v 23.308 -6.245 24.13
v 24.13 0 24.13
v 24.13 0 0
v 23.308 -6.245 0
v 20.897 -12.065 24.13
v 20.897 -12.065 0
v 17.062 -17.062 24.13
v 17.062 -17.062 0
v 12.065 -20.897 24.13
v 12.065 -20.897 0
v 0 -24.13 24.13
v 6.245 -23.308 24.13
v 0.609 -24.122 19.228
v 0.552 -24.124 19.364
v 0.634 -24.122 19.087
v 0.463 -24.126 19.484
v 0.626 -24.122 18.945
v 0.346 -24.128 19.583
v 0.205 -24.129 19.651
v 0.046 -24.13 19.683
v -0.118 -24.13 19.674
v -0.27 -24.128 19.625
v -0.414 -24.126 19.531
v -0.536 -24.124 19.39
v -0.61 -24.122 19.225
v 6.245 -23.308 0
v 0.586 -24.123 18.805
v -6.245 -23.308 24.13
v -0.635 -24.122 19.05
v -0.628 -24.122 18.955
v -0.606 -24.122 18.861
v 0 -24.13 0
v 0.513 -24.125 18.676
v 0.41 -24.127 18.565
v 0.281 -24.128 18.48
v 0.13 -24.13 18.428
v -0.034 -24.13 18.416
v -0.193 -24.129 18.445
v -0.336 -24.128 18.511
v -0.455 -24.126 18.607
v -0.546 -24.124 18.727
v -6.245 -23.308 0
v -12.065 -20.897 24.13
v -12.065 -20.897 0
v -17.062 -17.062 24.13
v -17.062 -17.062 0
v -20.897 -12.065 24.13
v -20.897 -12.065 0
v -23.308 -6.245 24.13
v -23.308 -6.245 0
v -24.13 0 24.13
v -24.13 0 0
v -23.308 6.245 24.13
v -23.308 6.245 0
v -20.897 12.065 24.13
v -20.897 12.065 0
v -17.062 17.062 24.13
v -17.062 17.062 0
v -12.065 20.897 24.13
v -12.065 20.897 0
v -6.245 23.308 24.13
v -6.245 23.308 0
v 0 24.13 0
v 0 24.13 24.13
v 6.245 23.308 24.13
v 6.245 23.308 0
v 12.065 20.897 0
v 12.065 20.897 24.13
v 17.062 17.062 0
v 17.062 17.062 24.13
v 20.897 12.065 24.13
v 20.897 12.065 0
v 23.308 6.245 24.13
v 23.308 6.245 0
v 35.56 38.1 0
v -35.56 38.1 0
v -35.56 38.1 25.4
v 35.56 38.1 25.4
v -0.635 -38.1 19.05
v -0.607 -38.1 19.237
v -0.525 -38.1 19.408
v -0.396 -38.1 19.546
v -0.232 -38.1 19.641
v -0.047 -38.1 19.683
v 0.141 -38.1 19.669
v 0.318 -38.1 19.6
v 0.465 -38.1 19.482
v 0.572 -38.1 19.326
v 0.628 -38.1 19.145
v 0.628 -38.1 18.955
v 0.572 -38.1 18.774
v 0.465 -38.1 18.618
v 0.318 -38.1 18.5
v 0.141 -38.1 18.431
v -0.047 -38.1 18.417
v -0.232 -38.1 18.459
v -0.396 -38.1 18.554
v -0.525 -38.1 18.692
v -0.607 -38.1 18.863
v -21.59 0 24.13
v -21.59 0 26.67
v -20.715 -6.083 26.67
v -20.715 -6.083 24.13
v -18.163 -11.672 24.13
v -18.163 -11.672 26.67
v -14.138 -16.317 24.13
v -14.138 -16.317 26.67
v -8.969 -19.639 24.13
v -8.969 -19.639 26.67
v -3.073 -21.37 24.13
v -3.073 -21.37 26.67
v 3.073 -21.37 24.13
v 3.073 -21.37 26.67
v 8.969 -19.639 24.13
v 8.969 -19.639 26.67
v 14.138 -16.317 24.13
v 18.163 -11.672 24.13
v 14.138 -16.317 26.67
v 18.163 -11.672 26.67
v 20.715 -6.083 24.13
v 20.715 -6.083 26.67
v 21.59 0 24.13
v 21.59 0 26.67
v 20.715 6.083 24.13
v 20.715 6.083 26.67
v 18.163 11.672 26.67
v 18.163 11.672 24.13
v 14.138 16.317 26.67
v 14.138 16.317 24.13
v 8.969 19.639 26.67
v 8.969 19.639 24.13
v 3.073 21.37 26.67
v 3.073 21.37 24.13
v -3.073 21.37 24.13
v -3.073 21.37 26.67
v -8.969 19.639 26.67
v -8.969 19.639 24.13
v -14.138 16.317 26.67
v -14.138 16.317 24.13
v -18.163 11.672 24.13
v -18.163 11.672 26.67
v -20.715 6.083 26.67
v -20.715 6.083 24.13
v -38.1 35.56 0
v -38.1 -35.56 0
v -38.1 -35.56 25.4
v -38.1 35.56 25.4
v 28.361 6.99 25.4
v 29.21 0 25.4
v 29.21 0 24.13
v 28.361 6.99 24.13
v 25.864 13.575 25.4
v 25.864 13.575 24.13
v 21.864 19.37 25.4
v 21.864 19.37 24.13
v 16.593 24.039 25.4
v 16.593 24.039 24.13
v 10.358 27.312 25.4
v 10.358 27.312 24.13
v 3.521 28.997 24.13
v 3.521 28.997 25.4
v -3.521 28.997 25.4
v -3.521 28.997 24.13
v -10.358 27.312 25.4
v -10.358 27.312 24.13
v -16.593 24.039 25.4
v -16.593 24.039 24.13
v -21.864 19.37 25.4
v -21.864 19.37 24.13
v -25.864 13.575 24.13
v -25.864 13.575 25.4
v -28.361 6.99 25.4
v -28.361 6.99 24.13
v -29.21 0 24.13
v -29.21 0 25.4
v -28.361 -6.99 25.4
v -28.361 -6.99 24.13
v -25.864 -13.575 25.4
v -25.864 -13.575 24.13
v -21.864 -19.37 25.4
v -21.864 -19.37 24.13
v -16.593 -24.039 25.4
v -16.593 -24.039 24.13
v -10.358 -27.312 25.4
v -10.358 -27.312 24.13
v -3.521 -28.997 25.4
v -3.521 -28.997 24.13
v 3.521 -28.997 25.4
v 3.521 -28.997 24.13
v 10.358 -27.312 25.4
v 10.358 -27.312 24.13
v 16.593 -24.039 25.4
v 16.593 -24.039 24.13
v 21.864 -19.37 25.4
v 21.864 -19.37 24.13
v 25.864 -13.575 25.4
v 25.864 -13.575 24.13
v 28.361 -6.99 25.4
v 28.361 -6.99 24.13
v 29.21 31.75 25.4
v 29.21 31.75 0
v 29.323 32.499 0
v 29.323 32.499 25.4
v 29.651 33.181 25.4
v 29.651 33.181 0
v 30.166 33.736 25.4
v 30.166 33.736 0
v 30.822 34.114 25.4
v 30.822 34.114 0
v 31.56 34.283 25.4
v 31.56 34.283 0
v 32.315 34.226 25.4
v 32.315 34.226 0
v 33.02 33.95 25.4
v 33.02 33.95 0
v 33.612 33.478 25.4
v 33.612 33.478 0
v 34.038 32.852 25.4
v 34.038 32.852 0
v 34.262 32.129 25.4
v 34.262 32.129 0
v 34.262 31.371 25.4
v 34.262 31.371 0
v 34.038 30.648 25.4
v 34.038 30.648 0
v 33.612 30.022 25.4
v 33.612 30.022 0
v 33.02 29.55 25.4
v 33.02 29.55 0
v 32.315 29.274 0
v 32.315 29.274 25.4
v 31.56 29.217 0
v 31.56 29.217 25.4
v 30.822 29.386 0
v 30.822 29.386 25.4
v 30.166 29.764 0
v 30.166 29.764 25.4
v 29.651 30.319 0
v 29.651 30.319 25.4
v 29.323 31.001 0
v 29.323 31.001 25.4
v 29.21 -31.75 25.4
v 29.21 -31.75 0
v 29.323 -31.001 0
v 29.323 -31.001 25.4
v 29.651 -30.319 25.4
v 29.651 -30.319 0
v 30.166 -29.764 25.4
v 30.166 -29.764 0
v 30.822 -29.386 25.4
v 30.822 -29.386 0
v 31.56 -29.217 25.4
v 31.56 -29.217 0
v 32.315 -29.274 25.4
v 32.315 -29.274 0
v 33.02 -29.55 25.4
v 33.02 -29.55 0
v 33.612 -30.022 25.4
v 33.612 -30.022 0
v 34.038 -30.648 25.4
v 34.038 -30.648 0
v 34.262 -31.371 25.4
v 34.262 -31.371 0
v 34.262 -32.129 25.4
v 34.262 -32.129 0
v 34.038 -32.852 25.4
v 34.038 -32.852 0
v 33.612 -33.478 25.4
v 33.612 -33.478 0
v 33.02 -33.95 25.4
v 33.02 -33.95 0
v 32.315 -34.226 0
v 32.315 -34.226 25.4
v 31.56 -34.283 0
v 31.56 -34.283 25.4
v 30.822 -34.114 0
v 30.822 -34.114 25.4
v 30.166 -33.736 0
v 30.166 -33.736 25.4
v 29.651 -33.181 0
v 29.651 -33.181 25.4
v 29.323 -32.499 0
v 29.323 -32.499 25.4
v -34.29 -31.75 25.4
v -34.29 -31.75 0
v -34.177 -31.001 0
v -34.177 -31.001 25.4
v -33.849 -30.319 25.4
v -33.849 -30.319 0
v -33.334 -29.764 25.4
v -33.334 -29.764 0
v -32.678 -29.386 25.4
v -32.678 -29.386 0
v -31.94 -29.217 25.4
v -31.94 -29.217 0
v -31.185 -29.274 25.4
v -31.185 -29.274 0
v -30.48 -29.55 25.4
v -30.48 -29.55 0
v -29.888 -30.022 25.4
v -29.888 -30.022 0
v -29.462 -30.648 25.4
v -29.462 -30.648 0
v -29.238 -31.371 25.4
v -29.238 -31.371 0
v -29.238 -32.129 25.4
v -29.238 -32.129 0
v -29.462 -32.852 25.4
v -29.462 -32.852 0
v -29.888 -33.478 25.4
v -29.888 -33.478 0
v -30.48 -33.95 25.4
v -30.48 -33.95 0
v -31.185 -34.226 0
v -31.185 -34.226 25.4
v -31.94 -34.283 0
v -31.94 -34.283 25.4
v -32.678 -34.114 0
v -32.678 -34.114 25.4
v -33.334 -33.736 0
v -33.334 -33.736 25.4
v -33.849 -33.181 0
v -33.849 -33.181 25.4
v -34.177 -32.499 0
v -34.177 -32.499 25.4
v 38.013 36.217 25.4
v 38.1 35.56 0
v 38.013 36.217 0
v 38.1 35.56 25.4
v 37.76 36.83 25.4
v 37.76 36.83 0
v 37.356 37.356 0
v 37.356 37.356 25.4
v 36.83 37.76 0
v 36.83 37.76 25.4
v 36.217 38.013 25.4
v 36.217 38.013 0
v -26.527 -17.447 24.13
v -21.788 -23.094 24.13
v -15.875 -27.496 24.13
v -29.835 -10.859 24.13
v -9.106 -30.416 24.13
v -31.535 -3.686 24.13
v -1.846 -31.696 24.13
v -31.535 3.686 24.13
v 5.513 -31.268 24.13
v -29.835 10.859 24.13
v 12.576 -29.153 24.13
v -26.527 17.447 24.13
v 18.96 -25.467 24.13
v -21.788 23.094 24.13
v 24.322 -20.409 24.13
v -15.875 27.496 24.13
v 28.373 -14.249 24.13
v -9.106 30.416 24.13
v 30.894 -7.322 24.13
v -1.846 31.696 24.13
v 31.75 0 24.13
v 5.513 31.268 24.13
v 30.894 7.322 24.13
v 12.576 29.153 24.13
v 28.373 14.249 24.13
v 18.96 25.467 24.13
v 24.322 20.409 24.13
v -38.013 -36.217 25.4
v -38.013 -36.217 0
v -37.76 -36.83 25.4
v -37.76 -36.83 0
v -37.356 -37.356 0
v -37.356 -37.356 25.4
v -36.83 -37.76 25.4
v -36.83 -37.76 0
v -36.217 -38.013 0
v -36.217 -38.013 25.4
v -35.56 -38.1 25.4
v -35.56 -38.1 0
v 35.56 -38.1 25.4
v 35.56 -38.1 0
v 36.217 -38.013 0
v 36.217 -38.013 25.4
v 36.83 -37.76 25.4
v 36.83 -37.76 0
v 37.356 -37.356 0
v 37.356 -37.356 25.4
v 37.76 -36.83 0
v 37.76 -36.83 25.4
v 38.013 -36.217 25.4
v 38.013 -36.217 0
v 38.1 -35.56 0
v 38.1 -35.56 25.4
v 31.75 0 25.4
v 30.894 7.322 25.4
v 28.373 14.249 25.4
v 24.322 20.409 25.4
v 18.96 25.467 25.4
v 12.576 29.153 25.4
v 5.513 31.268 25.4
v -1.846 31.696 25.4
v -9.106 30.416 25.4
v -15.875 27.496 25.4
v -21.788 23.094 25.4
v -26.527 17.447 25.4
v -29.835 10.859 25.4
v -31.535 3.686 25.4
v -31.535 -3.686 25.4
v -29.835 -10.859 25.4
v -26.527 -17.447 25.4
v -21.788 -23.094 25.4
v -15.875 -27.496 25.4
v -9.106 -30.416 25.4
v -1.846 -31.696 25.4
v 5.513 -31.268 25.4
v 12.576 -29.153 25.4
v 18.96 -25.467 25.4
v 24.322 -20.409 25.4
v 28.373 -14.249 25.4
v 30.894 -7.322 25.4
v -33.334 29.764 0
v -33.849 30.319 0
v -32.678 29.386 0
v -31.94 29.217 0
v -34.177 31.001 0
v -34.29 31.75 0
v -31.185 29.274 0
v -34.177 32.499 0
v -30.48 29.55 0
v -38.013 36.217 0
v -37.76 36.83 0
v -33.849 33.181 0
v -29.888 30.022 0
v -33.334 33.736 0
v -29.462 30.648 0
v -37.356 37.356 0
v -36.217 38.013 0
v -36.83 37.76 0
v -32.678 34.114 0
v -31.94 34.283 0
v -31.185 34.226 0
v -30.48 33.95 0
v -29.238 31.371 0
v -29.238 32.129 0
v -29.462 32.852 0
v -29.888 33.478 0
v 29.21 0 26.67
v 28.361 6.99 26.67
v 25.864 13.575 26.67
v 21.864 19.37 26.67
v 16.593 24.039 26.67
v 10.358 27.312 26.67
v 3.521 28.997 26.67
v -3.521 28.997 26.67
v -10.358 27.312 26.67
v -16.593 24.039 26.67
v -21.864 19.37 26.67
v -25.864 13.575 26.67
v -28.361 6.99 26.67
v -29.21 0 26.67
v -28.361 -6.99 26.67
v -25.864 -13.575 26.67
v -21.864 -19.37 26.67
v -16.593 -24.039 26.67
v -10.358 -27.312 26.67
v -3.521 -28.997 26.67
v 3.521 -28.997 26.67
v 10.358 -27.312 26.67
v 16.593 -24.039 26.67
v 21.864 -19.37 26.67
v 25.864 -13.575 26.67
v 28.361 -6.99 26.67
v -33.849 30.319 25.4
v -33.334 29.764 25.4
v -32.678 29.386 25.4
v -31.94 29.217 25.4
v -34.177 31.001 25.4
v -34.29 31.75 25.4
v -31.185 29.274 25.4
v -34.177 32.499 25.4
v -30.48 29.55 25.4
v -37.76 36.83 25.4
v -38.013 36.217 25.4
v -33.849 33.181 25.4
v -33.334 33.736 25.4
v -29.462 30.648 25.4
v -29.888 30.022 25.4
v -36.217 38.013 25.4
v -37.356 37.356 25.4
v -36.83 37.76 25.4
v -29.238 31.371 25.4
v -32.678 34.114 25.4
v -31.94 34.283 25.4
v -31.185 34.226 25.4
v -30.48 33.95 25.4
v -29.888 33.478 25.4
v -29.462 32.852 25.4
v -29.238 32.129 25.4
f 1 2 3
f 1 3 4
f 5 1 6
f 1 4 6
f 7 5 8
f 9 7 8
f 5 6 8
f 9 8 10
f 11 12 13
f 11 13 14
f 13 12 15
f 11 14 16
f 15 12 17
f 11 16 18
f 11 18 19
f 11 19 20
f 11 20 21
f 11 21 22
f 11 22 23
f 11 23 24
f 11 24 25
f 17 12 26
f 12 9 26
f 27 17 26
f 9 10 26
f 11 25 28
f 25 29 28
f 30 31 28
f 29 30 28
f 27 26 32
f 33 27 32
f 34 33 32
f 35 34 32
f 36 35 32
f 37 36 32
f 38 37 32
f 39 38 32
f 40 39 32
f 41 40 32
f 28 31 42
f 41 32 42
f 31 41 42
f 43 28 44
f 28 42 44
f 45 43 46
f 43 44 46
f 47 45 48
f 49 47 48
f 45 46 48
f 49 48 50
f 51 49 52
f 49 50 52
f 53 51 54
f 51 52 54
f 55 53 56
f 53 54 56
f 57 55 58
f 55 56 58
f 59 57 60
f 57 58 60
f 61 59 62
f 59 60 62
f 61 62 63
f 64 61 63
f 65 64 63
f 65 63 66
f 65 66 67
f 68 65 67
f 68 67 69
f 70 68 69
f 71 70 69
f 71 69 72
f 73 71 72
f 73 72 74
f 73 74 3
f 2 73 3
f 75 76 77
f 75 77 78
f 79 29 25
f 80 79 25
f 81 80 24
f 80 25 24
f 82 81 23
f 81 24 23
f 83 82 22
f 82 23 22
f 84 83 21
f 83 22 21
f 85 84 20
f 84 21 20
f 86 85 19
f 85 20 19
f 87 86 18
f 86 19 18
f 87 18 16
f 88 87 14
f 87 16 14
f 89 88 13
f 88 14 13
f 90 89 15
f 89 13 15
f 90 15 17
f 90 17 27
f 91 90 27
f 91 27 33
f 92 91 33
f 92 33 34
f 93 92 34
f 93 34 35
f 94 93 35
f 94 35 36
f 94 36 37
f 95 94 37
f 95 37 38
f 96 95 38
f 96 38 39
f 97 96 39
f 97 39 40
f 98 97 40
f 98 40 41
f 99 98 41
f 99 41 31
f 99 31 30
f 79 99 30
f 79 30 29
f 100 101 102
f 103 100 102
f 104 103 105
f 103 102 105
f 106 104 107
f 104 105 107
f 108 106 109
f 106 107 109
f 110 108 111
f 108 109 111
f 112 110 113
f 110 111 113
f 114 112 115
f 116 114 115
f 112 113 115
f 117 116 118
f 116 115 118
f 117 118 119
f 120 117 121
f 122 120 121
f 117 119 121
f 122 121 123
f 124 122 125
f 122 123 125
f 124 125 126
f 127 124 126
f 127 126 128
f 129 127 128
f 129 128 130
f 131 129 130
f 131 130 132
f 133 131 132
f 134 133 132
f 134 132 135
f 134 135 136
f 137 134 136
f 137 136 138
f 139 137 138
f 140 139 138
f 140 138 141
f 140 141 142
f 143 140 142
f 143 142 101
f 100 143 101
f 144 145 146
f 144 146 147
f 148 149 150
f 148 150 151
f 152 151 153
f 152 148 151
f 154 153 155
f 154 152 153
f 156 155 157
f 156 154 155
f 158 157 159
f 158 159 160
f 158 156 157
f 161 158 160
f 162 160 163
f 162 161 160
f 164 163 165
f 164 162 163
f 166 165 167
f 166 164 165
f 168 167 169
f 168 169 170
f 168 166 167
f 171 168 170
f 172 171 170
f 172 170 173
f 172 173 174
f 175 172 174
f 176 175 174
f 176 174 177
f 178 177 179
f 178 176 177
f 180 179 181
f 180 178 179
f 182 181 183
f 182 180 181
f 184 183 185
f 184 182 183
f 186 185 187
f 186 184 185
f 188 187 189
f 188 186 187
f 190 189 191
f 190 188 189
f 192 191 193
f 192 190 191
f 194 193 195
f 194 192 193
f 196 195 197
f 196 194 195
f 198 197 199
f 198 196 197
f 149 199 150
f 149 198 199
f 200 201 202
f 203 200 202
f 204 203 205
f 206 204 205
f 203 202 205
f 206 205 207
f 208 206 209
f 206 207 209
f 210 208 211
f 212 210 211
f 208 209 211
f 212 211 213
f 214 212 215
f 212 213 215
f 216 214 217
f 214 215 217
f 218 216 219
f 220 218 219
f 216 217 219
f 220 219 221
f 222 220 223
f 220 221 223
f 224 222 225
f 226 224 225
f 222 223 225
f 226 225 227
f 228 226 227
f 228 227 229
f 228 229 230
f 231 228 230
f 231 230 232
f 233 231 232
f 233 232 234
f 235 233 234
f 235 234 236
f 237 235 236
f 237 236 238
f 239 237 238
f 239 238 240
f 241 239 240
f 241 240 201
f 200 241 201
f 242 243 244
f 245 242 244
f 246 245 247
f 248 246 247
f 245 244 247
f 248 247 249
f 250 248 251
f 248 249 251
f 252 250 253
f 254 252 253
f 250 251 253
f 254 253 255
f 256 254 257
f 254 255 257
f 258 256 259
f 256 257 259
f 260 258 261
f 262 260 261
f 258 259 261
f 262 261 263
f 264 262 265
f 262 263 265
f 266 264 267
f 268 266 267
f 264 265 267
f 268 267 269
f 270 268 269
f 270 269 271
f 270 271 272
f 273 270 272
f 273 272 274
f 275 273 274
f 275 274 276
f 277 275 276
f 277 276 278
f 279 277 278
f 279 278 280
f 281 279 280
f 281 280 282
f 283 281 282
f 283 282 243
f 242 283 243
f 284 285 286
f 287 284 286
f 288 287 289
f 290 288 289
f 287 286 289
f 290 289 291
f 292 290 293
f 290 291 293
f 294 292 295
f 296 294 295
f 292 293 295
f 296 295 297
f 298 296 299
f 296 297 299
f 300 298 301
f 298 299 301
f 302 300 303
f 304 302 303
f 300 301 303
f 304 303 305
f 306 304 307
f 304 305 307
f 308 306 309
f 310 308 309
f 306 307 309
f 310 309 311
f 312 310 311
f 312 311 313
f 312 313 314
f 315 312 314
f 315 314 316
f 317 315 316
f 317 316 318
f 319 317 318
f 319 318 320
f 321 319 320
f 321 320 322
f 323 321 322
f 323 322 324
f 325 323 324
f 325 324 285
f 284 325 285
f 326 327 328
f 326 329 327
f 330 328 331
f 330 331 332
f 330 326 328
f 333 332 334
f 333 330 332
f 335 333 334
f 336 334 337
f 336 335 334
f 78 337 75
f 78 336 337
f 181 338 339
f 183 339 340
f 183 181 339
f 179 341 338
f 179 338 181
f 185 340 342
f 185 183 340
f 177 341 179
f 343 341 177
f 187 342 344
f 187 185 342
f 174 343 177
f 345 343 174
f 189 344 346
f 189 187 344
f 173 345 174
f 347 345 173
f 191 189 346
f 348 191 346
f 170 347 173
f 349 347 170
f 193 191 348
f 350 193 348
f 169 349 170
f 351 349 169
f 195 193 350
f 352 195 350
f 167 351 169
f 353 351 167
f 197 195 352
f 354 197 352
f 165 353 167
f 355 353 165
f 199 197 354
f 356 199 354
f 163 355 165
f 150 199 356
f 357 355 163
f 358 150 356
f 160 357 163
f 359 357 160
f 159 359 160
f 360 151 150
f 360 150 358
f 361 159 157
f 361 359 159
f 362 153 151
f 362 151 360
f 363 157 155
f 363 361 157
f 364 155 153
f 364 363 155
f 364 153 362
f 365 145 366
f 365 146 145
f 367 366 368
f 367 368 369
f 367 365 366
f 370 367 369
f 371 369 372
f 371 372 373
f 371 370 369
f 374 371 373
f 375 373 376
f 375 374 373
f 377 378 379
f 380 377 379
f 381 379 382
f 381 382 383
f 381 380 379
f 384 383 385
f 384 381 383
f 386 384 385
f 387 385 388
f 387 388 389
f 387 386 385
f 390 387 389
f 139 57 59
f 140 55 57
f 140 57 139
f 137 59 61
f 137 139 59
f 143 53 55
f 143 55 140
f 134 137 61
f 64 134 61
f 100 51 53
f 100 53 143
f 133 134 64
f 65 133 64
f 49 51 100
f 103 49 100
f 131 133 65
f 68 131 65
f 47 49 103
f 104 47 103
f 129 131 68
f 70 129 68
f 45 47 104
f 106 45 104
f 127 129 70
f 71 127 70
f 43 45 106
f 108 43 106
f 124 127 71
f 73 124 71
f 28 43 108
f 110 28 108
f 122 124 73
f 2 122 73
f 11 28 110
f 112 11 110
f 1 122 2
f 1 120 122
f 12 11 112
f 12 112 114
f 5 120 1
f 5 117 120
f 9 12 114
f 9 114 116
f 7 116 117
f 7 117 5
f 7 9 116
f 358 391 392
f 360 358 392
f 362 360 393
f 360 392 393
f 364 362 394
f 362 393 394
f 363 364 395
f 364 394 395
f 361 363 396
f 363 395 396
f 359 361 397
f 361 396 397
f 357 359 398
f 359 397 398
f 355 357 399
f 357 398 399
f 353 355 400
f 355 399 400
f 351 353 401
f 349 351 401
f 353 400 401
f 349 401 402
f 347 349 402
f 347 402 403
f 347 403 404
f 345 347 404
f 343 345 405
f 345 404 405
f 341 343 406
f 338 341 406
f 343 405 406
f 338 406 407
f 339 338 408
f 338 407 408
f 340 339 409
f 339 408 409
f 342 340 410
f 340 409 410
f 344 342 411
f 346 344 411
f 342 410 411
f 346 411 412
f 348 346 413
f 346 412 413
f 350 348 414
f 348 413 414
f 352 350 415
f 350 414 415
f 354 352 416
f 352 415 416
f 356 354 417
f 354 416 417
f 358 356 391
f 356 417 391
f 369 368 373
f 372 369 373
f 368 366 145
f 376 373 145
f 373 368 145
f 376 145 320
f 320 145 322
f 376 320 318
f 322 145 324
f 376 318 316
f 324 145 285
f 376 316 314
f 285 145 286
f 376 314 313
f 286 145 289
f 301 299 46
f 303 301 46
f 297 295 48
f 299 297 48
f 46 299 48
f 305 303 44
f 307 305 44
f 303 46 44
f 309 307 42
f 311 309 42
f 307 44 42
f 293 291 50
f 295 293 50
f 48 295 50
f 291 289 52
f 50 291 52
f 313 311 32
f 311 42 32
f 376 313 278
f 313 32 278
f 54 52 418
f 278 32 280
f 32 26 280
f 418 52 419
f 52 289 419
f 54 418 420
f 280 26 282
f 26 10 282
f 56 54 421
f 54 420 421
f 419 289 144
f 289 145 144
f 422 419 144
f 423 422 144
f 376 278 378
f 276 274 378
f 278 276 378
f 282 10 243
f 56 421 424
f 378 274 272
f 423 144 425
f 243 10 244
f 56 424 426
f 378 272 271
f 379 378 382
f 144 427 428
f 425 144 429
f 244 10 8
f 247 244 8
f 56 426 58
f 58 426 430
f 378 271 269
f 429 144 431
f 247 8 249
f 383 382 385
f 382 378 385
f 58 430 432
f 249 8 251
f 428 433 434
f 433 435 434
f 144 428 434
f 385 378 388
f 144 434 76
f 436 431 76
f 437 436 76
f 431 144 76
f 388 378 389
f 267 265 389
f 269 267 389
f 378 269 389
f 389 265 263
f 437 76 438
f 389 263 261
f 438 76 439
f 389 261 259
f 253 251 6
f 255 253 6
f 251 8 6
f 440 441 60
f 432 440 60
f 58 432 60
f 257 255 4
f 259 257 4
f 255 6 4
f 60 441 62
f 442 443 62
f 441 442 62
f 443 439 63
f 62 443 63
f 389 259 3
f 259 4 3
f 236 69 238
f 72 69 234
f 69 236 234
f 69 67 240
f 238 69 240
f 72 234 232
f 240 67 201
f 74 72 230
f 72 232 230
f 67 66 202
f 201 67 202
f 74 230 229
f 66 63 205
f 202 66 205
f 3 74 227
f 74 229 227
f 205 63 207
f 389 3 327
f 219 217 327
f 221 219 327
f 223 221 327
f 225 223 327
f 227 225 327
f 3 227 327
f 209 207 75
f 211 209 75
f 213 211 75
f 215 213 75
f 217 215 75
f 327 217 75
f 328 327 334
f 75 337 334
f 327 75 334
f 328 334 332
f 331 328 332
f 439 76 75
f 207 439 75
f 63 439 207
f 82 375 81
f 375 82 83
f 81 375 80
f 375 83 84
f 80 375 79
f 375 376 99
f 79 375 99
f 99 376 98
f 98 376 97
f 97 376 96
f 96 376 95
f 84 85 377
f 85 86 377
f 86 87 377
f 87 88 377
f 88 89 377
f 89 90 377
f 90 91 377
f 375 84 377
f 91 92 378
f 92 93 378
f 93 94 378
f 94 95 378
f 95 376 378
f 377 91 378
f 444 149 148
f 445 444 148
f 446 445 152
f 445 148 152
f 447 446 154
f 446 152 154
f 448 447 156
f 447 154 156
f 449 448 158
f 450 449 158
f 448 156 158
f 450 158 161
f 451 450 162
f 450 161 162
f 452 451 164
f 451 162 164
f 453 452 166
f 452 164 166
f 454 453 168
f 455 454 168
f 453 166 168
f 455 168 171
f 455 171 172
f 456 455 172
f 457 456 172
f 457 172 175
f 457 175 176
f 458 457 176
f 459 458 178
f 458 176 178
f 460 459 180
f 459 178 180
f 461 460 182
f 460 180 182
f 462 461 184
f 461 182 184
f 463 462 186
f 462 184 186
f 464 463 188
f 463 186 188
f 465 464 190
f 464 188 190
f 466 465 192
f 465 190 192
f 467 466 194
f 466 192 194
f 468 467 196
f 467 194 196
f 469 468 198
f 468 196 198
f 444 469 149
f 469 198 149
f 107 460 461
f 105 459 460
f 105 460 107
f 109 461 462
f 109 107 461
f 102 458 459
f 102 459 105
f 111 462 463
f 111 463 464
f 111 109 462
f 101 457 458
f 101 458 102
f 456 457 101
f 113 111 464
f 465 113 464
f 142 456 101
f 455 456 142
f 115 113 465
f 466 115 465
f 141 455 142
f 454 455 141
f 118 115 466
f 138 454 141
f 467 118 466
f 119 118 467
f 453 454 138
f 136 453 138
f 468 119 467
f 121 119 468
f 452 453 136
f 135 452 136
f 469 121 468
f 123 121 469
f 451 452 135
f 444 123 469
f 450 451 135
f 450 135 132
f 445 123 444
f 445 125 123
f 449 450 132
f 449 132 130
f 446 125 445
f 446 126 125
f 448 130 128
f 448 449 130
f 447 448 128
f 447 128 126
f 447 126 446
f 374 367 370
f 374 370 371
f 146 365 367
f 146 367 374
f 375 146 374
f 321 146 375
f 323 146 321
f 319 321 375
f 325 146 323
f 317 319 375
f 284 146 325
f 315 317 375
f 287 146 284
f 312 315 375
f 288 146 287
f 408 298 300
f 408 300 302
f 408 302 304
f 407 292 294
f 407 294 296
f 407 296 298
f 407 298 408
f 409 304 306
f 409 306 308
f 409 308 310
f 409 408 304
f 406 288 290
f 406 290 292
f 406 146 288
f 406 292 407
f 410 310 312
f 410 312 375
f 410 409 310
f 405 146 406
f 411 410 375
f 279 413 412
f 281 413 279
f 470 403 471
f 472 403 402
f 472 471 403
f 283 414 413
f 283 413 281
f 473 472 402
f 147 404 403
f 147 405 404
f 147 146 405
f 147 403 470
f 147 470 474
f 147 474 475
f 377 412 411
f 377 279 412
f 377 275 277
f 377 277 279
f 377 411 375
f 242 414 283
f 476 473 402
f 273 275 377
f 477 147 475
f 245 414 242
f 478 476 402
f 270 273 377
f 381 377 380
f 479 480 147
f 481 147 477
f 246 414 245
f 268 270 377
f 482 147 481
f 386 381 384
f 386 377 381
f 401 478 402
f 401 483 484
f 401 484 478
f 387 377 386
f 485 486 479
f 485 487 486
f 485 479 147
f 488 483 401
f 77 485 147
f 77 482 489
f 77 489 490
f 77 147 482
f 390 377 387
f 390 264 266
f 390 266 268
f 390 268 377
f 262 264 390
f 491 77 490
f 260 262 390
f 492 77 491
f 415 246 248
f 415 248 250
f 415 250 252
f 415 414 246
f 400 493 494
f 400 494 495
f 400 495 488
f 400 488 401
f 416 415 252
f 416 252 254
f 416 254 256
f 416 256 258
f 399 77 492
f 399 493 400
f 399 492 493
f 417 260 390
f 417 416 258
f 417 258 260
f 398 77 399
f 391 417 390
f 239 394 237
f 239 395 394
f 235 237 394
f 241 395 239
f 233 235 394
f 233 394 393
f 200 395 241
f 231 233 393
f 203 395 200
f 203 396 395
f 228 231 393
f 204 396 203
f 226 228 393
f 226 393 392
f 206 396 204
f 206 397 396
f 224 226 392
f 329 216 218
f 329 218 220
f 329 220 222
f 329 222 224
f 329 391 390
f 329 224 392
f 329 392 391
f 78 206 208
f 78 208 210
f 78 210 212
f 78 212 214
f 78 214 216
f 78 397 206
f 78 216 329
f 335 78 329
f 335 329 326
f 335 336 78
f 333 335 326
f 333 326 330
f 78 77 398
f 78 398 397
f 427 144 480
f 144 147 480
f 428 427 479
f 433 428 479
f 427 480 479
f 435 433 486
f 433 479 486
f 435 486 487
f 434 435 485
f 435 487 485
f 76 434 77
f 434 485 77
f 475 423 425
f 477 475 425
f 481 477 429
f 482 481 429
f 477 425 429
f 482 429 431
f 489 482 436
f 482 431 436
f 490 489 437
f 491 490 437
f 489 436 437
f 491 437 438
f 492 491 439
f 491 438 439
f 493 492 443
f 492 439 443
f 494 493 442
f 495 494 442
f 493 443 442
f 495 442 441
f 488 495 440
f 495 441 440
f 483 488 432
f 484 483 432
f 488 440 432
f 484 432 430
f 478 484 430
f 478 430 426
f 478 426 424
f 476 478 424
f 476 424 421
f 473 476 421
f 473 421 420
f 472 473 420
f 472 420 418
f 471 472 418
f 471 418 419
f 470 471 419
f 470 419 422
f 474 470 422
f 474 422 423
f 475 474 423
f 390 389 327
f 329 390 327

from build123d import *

# Parameters (mm, degrees)
F0_W      = 76.2
F0_H      = 76.2
F1_DEPTH  = 25.4
F2_R      = 2.54
F3_R      = 31.75
F3_R_2    = 29.21
F4_DEPTH  = 1.27
F5_D      = 5.08
F4_FACE_R = 29.21
F6_DEPTH  = 1.27
F7_R      = 24.13
F8_DEPTH  = 24.13
F9_D      = 43.18
F11_D     = 1.27
F11_DEPTH = 25.4


with BuildPart() as f1:
    # F0 (on Top) → F1 (new body)
    with BuildSketch(Plane.XY):
        Rectangle(F0_W, F0_H)
    extrude(amount=F1_DEPTH)

    # F2
    f2_edges = [f1.edges().sort_by_distance(p)[0] for p in [
        (38.1, -38.1, 12.7),
        (38.1, 38.1, 12.7),
        (-38.1, -38.1, 12.7),
        (-38.1, 38.1, 12.7),
    ]]
    fillet(f2_edges, radius=F2_R)

    # F3 (on face) → F4 (cut)
    with BuildSketch(Plane.XY.offset(25.4)):
        Circle(F3_R)
        Circle(F3_R_2, mode=Mode.SUBTRACT)
    extrude(amount=-F4_DEPTH, mode=Mode.SUBTRACT)

    # F5 (through all)
    with Locations(Plane.XY.offset(25.4)):
        with Locations((-31.75, 31.75), (31.75, 31.75), (31.75, -31.75), (-31.75, -31.75)):
            Hole(F5_D / 2)

    # F4_face (on face) → F6 (join)
    with BuildSketch(Plane.XY.offset(25.4)):
        Circle(F4_FACE_R)
    extrude(amount=F6_DEPTH)

    # F7 (on face) → F8 (cut)
    with BuildSketch(Plane(origin=(0, 0, 0), x_dir=(1, 0, 0), z_dir=(0, 0, -1))):
        Circle(F7_R)
    extrude(amount=-F8_DEPTH, mode=Mode.SUBTRACT)

    # F9 (through all)
    with Locations(Plane(origin=(0, 0, 0), x_dir=(1, 0, 0), z_dir=(0, 0, -1))):
        with Locations((0, 0)):
            Hole(F9_D / 2)

    # F11
    with Locations(Plane.XZ.offset(38.1)):
        with Locations((0, 19.05)):
            Hole(F11_D / 2, depth=F11_DEPTH)


solid = f1.part
